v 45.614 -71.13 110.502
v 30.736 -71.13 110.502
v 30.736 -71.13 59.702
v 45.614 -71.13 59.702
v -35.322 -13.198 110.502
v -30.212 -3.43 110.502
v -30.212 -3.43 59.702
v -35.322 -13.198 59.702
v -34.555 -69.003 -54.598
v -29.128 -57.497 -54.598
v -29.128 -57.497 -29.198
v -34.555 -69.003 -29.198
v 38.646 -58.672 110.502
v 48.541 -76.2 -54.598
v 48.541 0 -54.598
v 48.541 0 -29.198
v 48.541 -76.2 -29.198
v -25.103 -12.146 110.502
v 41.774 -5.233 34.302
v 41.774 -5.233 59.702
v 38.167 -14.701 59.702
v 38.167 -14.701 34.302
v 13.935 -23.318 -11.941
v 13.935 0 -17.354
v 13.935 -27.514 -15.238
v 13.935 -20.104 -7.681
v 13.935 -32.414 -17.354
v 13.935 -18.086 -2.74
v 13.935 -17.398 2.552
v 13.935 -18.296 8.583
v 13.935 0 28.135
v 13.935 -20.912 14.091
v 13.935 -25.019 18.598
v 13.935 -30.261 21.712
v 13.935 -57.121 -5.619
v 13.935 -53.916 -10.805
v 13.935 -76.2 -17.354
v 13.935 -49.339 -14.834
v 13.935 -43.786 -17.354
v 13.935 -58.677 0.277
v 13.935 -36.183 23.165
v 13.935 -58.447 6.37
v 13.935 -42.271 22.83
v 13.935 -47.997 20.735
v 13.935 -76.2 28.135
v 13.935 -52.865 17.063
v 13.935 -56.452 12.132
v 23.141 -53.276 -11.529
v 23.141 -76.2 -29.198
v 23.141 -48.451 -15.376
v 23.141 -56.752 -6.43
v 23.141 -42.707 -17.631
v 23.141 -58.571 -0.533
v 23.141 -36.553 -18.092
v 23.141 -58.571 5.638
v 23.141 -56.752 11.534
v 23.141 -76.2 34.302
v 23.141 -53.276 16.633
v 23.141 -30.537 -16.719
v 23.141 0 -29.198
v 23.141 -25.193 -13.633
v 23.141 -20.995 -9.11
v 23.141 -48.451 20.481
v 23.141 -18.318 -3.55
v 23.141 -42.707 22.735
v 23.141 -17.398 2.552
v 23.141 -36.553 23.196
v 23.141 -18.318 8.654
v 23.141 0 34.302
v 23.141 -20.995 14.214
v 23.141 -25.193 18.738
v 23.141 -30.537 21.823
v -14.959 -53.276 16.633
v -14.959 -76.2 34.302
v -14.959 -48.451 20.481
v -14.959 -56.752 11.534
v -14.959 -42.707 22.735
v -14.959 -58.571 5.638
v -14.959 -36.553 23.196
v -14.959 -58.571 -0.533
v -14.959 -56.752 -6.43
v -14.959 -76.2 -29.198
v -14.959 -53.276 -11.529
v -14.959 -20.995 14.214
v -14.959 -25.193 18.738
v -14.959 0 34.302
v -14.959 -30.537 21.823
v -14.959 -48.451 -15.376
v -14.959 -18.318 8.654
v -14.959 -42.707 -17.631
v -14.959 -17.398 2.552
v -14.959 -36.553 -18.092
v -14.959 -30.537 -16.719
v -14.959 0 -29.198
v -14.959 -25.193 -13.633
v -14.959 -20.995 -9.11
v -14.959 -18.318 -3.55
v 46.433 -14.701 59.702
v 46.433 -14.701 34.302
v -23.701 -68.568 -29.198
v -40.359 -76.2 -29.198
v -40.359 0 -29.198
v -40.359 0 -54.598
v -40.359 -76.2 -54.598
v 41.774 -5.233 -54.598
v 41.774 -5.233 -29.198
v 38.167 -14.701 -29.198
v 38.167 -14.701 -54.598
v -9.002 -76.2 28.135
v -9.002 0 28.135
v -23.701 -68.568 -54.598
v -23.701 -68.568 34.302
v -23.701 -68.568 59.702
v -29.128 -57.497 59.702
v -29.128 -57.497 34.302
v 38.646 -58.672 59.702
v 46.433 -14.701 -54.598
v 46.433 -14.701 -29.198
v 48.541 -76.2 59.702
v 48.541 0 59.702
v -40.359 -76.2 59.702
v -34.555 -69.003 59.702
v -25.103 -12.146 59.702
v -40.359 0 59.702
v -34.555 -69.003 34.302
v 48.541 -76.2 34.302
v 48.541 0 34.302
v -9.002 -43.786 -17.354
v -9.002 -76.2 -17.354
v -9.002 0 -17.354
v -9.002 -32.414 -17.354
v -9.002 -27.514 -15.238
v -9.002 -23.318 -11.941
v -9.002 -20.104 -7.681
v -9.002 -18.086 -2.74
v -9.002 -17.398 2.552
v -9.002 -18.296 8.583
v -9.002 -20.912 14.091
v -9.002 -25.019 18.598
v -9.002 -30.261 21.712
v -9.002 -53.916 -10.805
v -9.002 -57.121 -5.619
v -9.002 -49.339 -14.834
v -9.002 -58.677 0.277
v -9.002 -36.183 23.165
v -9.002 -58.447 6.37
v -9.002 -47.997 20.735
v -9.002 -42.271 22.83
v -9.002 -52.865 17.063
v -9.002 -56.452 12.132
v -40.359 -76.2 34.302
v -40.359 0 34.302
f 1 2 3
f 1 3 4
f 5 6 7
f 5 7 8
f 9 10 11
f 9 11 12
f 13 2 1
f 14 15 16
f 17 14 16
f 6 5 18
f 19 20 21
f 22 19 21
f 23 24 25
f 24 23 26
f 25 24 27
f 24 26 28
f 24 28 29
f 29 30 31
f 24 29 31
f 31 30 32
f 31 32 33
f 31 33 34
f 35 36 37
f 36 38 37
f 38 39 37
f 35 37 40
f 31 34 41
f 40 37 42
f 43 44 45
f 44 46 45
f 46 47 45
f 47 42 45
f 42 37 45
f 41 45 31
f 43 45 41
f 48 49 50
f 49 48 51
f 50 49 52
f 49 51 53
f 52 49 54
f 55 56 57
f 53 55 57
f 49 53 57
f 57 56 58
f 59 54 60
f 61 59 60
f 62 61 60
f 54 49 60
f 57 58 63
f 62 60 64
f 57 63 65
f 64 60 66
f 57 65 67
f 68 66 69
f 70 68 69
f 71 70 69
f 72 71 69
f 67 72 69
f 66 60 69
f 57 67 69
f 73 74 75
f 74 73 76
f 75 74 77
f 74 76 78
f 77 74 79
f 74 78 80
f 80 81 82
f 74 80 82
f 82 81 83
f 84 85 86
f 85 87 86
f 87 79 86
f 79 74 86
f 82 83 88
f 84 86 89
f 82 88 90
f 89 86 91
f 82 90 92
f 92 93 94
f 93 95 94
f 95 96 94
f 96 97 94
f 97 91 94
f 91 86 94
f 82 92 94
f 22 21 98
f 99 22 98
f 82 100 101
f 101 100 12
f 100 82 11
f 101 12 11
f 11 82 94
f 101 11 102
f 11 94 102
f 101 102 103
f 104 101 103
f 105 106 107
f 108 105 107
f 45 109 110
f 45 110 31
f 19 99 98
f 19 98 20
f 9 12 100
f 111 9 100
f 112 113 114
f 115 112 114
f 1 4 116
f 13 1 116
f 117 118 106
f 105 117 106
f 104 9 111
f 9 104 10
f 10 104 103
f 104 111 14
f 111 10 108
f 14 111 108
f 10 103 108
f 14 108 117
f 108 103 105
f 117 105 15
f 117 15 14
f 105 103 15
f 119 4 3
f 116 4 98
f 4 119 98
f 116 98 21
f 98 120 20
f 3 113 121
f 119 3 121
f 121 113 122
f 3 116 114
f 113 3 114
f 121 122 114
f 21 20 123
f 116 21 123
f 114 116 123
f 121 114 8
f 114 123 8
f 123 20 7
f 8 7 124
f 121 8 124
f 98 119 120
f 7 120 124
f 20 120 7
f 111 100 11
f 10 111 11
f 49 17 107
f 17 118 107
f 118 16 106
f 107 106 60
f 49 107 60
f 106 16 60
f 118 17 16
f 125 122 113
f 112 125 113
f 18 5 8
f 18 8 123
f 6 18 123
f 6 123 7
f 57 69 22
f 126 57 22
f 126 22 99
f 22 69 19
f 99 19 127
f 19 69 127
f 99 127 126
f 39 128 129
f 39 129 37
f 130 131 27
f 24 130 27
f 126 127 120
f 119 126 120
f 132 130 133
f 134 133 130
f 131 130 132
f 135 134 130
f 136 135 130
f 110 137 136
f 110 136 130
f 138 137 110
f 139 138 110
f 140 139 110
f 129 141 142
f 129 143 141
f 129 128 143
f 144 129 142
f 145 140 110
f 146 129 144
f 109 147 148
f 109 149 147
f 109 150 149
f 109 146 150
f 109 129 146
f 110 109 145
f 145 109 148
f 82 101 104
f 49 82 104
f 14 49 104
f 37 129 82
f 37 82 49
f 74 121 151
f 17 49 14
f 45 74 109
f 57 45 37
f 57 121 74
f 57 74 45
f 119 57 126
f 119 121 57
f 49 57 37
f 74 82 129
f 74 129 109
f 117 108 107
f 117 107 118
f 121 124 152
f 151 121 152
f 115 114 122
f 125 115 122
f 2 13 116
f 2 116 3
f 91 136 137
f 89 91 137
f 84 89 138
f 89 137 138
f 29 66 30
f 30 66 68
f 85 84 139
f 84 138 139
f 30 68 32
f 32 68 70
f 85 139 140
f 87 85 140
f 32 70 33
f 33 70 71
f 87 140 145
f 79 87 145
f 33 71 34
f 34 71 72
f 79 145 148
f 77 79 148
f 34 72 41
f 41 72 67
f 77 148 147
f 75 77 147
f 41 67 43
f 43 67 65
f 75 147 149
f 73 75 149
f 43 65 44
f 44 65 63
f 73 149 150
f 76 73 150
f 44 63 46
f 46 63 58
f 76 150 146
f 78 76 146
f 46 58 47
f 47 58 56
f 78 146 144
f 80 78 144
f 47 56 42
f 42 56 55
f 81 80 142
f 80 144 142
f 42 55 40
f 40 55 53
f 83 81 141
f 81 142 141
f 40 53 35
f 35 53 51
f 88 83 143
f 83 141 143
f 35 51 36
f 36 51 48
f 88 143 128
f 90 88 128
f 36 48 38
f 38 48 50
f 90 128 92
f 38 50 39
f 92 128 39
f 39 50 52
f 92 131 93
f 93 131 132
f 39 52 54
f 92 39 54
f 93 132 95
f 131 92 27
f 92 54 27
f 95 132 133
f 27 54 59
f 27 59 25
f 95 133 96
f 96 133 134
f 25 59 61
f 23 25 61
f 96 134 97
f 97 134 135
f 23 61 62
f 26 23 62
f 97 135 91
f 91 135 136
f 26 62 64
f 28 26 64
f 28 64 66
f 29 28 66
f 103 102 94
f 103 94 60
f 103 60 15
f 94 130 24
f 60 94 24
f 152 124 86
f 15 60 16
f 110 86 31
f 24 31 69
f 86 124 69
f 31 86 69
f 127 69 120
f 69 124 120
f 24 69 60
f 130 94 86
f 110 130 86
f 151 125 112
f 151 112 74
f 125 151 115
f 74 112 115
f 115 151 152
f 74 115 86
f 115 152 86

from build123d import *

# Parameters (mm, degrees)
F1_DEPTH  = 76.2
F2_R      = 20.701916
F3_DEPTH  = 63.501
F5_DEPTH  = 50.8
F7_DEPTH  = 114.301
F9_DEPTH  = 50.8
F11_DEPTH = 114.301
F12_W     = 22.93722
F12_H     = 45.488945
F13_DEPTH = 76.201


with BuildPart() as f1:
    # F0 (on Front) → F1 (new body)
    with BuildSketch(Plane.XZ):
        Polygon((-40.358745, -29.197829), (-40.358745, -54.597829), (48.541255, -54.597829), (48.541255, -29.197829), (23.141255, -29.197829), (23.141255, 34.302171), (48.541255, 34.302171), (48.541255, 59.702171), (-40.358745, 59.702171), (-40.358745, 34.302171), (-14.958745, 34.302171), (-14.958745, -29.197829), align=None)
    extrude(amount=F1_DEPTH)

    # F2 (on face) → F3 (cut, through all)
    with BuildSketch(Plane.YZ.offset(23.141255)):
        with Locations((-38.1, 2.552171)):
            Circle(F2_R)
    extrude(amount=-F3_DEPTH, mode=Mode.SUBTRACT)

    # F4 (on face) → F5 (join)
    with BuildSketch(Plane.XY.offset(59.702171)):
        Polygon((38.645647, -58.671612), (30.735792, -71.129635), (45.613699, -71.129635), align=None)
    extrude(amount=F5_DEPTH)

    # F6 (on face) → F7 (cut, through all)
    with BuildSketch(Plane.XY.offset(59.702171)):
        Polygon((-29.12768, -57.497039), (-34.554791, -69.002517), (-23.700567, -68.568349), align=None)
    extrude(amount=-F7_DEPTH, mode=Mode.SUBTRACT)

    # F8 (on face) → F9 (join)
    with BuildSketch(Plane.XY.offset(59.702171)):
        Polygon((-30.212333, -3.429755), (-35.322022, -13.198283), (-25.102641, -12.146287), align=None)
    extrude(amount=F9_DEPTH)

    # F10 (on face) → F11 (cut, through all)
    with BuildSketch(Plane.XY.offset(59.702171)):
        Polygon((41.774195, -5.233176), (38.167354, -14.701133), (46.433032, -14.701133), align=None)
    extrude(amount=-F11_DEPTH, mode=Mode.SUBTRACT)

    # F12 (on face) → F13 (cut, through all)
    with BuildSketch(Plane.XZ.offset(76.2)):
        with Locations((2.466541, 5.390951)):
            Rectangle(F12_W, F12_H)
    extrude(amount=-F13_DEPTH, mode=Mode.SUBTRACT)


solid = f1.part
